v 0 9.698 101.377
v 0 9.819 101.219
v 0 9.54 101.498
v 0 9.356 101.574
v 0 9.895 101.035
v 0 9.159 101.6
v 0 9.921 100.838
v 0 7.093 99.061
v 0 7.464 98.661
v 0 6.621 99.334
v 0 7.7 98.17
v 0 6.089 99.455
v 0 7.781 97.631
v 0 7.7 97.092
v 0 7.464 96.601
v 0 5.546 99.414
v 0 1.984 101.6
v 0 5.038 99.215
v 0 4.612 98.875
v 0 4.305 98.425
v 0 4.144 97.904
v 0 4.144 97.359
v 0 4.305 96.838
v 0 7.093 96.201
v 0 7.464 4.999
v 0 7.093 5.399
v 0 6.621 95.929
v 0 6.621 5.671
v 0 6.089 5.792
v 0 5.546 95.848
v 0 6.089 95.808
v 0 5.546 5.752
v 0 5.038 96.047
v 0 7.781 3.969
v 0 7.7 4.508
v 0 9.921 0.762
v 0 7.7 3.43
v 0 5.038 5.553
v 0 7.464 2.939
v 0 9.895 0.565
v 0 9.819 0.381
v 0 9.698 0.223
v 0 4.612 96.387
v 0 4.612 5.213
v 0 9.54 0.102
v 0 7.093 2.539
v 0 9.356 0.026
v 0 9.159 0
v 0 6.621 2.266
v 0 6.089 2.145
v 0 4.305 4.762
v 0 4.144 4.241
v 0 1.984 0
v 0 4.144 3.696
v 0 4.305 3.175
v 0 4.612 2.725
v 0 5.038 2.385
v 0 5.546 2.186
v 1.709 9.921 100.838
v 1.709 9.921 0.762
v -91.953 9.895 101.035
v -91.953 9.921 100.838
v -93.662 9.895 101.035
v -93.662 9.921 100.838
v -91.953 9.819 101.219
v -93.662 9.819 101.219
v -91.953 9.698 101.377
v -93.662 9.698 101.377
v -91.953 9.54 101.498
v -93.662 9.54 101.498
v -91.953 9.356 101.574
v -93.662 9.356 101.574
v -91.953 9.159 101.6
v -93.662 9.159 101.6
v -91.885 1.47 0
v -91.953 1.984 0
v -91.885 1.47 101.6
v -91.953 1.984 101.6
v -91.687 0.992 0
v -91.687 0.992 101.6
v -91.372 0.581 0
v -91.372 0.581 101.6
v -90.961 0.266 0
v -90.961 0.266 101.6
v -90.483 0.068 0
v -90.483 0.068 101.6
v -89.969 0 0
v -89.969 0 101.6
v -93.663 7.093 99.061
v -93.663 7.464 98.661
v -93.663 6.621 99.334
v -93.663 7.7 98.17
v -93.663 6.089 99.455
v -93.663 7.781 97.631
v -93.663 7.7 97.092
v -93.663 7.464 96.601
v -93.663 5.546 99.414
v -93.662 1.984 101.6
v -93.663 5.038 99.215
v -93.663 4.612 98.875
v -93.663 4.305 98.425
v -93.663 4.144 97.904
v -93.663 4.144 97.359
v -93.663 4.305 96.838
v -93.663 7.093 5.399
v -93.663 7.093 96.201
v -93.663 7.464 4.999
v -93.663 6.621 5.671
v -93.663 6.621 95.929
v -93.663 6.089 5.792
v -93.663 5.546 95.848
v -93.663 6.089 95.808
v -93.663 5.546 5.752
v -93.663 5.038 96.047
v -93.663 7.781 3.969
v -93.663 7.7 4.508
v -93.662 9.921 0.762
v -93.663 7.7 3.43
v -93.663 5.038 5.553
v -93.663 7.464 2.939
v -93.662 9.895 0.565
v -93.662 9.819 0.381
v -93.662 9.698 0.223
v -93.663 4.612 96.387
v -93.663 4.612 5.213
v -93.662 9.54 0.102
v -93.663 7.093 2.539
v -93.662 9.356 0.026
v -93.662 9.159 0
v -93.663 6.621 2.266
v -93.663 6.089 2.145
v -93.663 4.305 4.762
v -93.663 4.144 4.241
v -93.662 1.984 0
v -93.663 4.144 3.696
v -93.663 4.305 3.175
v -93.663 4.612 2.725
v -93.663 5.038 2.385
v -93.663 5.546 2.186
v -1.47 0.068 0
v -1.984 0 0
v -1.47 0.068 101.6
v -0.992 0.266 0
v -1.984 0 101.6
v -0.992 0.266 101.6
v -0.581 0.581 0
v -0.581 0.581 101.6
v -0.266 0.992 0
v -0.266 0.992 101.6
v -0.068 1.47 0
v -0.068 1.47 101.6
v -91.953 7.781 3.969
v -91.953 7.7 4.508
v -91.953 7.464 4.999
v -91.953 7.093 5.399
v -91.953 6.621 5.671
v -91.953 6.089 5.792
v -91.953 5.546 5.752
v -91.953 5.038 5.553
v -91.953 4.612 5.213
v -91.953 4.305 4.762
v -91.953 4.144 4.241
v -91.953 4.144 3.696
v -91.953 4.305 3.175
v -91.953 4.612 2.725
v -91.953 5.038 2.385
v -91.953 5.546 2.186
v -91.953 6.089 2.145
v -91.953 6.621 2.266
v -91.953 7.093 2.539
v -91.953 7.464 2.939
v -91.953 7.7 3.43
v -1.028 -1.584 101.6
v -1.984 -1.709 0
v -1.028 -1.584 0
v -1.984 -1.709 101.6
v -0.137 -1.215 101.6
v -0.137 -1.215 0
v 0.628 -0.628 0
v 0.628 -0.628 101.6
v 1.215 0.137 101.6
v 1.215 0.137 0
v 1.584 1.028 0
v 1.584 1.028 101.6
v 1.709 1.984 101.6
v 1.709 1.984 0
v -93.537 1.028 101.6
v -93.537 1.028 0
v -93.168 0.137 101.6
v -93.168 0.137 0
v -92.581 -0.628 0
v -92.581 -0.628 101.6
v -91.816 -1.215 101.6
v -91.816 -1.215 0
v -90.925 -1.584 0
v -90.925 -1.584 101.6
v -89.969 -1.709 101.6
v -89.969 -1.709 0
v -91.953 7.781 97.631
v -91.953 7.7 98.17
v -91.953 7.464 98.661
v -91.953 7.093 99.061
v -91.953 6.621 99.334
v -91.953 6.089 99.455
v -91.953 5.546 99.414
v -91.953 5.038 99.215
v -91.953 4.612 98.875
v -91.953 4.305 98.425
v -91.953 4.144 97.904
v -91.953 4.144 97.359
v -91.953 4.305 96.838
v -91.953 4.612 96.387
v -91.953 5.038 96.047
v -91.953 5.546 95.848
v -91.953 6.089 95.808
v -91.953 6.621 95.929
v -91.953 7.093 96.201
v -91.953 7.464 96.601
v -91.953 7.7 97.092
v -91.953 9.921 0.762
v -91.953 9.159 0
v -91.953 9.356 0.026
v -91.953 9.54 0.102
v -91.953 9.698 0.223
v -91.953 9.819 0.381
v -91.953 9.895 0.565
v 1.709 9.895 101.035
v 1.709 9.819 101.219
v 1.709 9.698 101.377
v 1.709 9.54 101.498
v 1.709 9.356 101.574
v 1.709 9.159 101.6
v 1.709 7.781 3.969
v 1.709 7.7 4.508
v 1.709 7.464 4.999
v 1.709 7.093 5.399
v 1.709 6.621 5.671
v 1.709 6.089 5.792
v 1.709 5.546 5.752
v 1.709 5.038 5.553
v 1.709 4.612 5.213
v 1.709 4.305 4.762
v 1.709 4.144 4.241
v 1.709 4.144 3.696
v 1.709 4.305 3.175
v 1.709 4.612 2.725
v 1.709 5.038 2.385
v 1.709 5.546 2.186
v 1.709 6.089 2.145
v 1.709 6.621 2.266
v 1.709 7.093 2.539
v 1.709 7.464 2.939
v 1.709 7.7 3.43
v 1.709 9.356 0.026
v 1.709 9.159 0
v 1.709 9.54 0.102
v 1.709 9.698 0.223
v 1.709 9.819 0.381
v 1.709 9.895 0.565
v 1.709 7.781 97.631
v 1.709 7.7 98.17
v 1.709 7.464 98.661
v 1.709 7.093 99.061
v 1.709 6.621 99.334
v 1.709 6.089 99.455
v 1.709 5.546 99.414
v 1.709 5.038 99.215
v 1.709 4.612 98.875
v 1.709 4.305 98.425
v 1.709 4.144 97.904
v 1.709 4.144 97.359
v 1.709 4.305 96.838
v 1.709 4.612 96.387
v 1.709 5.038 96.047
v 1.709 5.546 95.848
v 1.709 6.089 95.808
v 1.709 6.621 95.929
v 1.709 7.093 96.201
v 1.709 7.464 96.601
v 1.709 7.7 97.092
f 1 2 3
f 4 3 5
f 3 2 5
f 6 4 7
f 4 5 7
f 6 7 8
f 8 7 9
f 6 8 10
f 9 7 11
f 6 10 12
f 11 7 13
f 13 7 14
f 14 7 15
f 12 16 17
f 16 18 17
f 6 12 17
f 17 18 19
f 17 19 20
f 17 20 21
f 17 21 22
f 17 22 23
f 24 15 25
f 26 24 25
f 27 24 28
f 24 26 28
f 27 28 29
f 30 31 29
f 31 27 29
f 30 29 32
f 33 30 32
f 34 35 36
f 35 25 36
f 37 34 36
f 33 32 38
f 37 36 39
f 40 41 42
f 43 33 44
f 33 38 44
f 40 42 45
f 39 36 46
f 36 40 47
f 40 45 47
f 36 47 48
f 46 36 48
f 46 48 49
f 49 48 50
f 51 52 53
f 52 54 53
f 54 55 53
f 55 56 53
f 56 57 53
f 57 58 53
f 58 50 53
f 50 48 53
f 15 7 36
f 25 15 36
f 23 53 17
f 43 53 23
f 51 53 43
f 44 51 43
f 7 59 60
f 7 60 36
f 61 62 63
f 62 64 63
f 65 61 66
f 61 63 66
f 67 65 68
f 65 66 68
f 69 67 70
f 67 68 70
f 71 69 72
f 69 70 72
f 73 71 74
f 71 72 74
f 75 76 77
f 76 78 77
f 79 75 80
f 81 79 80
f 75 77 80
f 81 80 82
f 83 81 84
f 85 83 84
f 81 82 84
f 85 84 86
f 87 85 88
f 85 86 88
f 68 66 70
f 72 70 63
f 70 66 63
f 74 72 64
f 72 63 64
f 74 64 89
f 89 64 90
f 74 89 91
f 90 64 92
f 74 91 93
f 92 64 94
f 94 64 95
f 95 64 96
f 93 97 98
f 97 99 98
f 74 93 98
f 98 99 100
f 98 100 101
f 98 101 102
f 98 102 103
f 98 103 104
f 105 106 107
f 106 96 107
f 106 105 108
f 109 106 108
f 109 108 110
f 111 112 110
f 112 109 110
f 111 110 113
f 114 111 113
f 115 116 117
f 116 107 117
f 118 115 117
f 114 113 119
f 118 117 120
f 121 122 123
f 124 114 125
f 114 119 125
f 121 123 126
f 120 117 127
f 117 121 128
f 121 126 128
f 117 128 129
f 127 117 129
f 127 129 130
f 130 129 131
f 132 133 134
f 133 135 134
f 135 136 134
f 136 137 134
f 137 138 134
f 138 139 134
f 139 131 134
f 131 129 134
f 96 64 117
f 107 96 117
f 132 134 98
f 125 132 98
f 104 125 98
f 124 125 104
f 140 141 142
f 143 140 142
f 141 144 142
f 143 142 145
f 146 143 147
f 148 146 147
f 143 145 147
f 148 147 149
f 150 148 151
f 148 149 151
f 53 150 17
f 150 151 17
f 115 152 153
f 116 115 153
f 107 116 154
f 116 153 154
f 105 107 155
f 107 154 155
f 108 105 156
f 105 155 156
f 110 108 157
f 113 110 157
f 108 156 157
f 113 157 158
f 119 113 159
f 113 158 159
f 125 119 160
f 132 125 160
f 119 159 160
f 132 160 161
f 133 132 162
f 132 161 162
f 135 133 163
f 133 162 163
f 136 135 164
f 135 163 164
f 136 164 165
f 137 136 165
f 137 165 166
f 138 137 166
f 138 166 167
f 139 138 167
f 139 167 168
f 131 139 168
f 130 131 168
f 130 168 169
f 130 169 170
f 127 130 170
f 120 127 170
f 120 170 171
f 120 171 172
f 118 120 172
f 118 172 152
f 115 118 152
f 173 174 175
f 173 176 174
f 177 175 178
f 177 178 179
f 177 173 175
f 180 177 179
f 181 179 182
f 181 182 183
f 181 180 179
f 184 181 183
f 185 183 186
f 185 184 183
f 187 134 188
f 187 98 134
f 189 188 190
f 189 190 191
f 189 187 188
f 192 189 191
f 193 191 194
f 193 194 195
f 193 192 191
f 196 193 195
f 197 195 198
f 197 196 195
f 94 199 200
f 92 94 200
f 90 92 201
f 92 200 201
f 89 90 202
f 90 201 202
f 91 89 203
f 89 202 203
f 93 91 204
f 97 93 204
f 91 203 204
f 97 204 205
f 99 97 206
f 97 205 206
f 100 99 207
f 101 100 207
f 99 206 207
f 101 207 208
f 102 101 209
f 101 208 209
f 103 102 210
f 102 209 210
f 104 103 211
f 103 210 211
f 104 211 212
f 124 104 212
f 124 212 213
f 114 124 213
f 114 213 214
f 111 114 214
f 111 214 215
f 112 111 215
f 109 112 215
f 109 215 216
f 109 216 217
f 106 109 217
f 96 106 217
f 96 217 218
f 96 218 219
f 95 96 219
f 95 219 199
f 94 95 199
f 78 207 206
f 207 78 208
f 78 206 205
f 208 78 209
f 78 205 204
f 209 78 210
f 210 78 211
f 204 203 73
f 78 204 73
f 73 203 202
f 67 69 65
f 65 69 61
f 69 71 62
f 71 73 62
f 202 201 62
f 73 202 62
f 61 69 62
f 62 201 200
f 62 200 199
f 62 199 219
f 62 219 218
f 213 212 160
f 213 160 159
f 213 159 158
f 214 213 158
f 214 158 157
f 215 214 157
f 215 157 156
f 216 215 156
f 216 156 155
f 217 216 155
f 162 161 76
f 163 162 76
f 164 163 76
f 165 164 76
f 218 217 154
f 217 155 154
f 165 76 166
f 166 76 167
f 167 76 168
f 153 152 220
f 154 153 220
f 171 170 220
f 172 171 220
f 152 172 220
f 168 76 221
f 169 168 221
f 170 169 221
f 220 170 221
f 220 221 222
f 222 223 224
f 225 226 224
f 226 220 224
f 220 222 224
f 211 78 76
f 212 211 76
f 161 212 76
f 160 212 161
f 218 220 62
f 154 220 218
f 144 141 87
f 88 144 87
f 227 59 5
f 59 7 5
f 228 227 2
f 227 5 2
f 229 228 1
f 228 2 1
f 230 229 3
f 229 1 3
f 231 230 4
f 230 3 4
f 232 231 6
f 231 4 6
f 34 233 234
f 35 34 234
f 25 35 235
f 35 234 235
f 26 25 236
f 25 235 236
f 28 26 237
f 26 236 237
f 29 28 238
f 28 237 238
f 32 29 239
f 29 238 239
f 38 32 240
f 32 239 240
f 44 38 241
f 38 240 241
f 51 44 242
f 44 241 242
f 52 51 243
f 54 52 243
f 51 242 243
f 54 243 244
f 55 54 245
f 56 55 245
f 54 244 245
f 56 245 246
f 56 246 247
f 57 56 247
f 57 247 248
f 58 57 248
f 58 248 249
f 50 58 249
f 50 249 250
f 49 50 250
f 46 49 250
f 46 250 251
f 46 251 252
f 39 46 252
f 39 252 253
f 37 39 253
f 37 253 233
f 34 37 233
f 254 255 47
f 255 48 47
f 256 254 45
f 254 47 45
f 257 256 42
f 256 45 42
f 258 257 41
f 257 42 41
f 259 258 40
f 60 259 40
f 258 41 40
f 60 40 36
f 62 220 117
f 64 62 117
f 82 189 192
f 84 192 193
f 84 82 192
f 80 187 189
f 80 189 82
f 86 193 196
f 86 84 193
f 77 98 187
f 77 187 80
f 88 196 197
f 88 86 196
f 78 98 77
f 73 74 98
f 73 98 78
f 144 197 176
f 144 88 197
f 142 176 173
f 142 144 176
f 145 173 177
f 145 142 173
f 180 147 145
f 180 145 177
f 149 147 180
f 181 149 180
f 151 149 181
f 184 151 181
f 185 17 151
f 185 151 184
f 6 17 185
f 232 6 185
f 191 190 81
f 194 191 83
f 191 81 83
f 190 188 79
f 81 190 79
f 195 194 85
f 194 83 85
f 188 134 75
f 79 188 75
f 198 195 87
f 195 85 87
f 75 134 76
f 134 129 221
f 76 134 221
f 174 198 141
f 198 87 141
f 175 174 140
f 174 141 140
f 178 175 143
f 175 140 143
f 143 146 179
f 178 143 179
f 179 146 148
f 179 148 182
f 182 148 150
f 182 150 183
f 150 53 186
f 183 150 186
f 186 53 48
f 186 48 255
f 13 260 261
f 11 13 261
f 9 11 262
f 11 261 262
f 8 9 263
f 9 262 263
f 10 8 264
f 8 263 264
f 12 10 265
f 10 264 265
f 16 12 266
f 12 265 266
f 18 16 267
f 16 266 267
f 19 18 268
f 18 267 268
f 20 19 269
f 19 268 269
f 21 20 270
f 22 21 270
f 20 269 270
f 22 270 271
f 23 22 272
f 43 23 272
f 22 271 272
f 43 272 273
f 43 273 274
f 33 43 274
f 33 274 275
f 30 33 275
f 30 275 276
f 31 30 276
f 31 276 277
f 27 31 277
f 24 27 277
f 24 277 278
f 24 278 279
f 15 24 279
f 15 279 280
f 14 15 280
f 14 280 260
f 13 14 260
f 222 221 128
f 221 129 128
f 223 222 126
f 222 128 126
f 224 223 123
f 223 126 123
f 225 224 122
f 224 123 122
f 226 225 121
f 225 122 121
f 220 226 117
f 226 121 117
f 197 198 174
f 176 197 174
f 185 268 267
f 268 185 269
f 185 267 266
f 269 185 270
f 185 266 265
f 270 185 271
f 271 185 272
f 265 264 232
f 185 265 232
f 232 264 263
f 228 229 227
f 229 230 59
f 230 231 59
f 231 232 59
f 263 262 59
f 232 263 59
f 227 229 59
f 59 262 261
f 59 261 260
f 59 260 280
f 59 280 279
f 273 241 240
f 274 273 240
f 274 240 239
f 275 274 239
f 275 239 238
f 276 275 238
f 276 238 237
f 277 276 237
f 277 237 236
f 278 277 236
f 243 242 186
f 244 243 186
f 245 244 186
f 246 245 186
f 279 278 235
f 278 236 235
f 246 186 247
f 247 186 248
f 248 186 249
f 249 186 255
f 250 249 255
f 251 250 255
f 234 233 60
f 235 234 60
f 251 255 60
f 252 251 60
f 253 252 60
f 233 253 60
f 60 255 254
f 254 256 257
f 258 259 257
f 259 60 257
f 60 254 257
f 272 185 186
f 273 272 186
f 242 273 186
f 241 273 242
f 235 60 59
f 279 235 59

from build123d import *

# Parameters (mm, degrees)
F1_DEPTH = 101.6
F2_R     = 3.69316
F3_R     = 1.98374
F4_R     = 1.8288
F5_DEPTH = 95.37192
F6_R     = 0.762


with BuildPart() as f1:
    # F0 (on Top) → F1 (new body)
    with BuildSketch(Plane.XY):
        Polygon((0, 9.92124), (0, 0), (-91.95308, 0), (-91.95308, 9.92124), (-93.6625, 9.92124), (-93.6625, -1.70942), (1.70942, -1.70942), (1.70942, 9.92124), align=None)
    extrude(amount=F1_DEPTH)

    # F2
    f2_edges = [f1.edges().sort_by_distance(p)[0] for p in [
        (1.70942, -1.70942, 50.8),
        (-93.6625, -1.70942, 50.8),
    ]]
    fillet(f2_edges, radius=F2_R)

    # F3
    f3_edges = [f1.edges().sort_by_distance(p)[0] for p in [
        (0, 0, 50.8),
        (-91.95308, 0, 50.8),
    ]]
    fillet(f3_edges, radius=F3_R)

    # F4 (on face) → F5 (cut, through all)
    with BuildSketch(Plane.YZ.offset(1.70942)):
        with Locations((5.95249, 97.63125)):
            Circle(F4_R)
        with Locations((5.95249, 3.96875)):
            Circle(F4_R)
    extrude(amount=-F5_DEPTH, mode=Mode.SUBTRACT)

    # F6
    f6_edges = [f1.edges().sort_by_distance(p)[0] for p in [
        (-92.80779, 9.92124, 101.6),
        (-92.80779, 9.92124, 0),
        (0.85471, 9.92124, 0),
        (0.85471, 9.92124, 101.6),
    ]]
    fillet(f6_edges, radius=F6_R)


solid = f1.part
